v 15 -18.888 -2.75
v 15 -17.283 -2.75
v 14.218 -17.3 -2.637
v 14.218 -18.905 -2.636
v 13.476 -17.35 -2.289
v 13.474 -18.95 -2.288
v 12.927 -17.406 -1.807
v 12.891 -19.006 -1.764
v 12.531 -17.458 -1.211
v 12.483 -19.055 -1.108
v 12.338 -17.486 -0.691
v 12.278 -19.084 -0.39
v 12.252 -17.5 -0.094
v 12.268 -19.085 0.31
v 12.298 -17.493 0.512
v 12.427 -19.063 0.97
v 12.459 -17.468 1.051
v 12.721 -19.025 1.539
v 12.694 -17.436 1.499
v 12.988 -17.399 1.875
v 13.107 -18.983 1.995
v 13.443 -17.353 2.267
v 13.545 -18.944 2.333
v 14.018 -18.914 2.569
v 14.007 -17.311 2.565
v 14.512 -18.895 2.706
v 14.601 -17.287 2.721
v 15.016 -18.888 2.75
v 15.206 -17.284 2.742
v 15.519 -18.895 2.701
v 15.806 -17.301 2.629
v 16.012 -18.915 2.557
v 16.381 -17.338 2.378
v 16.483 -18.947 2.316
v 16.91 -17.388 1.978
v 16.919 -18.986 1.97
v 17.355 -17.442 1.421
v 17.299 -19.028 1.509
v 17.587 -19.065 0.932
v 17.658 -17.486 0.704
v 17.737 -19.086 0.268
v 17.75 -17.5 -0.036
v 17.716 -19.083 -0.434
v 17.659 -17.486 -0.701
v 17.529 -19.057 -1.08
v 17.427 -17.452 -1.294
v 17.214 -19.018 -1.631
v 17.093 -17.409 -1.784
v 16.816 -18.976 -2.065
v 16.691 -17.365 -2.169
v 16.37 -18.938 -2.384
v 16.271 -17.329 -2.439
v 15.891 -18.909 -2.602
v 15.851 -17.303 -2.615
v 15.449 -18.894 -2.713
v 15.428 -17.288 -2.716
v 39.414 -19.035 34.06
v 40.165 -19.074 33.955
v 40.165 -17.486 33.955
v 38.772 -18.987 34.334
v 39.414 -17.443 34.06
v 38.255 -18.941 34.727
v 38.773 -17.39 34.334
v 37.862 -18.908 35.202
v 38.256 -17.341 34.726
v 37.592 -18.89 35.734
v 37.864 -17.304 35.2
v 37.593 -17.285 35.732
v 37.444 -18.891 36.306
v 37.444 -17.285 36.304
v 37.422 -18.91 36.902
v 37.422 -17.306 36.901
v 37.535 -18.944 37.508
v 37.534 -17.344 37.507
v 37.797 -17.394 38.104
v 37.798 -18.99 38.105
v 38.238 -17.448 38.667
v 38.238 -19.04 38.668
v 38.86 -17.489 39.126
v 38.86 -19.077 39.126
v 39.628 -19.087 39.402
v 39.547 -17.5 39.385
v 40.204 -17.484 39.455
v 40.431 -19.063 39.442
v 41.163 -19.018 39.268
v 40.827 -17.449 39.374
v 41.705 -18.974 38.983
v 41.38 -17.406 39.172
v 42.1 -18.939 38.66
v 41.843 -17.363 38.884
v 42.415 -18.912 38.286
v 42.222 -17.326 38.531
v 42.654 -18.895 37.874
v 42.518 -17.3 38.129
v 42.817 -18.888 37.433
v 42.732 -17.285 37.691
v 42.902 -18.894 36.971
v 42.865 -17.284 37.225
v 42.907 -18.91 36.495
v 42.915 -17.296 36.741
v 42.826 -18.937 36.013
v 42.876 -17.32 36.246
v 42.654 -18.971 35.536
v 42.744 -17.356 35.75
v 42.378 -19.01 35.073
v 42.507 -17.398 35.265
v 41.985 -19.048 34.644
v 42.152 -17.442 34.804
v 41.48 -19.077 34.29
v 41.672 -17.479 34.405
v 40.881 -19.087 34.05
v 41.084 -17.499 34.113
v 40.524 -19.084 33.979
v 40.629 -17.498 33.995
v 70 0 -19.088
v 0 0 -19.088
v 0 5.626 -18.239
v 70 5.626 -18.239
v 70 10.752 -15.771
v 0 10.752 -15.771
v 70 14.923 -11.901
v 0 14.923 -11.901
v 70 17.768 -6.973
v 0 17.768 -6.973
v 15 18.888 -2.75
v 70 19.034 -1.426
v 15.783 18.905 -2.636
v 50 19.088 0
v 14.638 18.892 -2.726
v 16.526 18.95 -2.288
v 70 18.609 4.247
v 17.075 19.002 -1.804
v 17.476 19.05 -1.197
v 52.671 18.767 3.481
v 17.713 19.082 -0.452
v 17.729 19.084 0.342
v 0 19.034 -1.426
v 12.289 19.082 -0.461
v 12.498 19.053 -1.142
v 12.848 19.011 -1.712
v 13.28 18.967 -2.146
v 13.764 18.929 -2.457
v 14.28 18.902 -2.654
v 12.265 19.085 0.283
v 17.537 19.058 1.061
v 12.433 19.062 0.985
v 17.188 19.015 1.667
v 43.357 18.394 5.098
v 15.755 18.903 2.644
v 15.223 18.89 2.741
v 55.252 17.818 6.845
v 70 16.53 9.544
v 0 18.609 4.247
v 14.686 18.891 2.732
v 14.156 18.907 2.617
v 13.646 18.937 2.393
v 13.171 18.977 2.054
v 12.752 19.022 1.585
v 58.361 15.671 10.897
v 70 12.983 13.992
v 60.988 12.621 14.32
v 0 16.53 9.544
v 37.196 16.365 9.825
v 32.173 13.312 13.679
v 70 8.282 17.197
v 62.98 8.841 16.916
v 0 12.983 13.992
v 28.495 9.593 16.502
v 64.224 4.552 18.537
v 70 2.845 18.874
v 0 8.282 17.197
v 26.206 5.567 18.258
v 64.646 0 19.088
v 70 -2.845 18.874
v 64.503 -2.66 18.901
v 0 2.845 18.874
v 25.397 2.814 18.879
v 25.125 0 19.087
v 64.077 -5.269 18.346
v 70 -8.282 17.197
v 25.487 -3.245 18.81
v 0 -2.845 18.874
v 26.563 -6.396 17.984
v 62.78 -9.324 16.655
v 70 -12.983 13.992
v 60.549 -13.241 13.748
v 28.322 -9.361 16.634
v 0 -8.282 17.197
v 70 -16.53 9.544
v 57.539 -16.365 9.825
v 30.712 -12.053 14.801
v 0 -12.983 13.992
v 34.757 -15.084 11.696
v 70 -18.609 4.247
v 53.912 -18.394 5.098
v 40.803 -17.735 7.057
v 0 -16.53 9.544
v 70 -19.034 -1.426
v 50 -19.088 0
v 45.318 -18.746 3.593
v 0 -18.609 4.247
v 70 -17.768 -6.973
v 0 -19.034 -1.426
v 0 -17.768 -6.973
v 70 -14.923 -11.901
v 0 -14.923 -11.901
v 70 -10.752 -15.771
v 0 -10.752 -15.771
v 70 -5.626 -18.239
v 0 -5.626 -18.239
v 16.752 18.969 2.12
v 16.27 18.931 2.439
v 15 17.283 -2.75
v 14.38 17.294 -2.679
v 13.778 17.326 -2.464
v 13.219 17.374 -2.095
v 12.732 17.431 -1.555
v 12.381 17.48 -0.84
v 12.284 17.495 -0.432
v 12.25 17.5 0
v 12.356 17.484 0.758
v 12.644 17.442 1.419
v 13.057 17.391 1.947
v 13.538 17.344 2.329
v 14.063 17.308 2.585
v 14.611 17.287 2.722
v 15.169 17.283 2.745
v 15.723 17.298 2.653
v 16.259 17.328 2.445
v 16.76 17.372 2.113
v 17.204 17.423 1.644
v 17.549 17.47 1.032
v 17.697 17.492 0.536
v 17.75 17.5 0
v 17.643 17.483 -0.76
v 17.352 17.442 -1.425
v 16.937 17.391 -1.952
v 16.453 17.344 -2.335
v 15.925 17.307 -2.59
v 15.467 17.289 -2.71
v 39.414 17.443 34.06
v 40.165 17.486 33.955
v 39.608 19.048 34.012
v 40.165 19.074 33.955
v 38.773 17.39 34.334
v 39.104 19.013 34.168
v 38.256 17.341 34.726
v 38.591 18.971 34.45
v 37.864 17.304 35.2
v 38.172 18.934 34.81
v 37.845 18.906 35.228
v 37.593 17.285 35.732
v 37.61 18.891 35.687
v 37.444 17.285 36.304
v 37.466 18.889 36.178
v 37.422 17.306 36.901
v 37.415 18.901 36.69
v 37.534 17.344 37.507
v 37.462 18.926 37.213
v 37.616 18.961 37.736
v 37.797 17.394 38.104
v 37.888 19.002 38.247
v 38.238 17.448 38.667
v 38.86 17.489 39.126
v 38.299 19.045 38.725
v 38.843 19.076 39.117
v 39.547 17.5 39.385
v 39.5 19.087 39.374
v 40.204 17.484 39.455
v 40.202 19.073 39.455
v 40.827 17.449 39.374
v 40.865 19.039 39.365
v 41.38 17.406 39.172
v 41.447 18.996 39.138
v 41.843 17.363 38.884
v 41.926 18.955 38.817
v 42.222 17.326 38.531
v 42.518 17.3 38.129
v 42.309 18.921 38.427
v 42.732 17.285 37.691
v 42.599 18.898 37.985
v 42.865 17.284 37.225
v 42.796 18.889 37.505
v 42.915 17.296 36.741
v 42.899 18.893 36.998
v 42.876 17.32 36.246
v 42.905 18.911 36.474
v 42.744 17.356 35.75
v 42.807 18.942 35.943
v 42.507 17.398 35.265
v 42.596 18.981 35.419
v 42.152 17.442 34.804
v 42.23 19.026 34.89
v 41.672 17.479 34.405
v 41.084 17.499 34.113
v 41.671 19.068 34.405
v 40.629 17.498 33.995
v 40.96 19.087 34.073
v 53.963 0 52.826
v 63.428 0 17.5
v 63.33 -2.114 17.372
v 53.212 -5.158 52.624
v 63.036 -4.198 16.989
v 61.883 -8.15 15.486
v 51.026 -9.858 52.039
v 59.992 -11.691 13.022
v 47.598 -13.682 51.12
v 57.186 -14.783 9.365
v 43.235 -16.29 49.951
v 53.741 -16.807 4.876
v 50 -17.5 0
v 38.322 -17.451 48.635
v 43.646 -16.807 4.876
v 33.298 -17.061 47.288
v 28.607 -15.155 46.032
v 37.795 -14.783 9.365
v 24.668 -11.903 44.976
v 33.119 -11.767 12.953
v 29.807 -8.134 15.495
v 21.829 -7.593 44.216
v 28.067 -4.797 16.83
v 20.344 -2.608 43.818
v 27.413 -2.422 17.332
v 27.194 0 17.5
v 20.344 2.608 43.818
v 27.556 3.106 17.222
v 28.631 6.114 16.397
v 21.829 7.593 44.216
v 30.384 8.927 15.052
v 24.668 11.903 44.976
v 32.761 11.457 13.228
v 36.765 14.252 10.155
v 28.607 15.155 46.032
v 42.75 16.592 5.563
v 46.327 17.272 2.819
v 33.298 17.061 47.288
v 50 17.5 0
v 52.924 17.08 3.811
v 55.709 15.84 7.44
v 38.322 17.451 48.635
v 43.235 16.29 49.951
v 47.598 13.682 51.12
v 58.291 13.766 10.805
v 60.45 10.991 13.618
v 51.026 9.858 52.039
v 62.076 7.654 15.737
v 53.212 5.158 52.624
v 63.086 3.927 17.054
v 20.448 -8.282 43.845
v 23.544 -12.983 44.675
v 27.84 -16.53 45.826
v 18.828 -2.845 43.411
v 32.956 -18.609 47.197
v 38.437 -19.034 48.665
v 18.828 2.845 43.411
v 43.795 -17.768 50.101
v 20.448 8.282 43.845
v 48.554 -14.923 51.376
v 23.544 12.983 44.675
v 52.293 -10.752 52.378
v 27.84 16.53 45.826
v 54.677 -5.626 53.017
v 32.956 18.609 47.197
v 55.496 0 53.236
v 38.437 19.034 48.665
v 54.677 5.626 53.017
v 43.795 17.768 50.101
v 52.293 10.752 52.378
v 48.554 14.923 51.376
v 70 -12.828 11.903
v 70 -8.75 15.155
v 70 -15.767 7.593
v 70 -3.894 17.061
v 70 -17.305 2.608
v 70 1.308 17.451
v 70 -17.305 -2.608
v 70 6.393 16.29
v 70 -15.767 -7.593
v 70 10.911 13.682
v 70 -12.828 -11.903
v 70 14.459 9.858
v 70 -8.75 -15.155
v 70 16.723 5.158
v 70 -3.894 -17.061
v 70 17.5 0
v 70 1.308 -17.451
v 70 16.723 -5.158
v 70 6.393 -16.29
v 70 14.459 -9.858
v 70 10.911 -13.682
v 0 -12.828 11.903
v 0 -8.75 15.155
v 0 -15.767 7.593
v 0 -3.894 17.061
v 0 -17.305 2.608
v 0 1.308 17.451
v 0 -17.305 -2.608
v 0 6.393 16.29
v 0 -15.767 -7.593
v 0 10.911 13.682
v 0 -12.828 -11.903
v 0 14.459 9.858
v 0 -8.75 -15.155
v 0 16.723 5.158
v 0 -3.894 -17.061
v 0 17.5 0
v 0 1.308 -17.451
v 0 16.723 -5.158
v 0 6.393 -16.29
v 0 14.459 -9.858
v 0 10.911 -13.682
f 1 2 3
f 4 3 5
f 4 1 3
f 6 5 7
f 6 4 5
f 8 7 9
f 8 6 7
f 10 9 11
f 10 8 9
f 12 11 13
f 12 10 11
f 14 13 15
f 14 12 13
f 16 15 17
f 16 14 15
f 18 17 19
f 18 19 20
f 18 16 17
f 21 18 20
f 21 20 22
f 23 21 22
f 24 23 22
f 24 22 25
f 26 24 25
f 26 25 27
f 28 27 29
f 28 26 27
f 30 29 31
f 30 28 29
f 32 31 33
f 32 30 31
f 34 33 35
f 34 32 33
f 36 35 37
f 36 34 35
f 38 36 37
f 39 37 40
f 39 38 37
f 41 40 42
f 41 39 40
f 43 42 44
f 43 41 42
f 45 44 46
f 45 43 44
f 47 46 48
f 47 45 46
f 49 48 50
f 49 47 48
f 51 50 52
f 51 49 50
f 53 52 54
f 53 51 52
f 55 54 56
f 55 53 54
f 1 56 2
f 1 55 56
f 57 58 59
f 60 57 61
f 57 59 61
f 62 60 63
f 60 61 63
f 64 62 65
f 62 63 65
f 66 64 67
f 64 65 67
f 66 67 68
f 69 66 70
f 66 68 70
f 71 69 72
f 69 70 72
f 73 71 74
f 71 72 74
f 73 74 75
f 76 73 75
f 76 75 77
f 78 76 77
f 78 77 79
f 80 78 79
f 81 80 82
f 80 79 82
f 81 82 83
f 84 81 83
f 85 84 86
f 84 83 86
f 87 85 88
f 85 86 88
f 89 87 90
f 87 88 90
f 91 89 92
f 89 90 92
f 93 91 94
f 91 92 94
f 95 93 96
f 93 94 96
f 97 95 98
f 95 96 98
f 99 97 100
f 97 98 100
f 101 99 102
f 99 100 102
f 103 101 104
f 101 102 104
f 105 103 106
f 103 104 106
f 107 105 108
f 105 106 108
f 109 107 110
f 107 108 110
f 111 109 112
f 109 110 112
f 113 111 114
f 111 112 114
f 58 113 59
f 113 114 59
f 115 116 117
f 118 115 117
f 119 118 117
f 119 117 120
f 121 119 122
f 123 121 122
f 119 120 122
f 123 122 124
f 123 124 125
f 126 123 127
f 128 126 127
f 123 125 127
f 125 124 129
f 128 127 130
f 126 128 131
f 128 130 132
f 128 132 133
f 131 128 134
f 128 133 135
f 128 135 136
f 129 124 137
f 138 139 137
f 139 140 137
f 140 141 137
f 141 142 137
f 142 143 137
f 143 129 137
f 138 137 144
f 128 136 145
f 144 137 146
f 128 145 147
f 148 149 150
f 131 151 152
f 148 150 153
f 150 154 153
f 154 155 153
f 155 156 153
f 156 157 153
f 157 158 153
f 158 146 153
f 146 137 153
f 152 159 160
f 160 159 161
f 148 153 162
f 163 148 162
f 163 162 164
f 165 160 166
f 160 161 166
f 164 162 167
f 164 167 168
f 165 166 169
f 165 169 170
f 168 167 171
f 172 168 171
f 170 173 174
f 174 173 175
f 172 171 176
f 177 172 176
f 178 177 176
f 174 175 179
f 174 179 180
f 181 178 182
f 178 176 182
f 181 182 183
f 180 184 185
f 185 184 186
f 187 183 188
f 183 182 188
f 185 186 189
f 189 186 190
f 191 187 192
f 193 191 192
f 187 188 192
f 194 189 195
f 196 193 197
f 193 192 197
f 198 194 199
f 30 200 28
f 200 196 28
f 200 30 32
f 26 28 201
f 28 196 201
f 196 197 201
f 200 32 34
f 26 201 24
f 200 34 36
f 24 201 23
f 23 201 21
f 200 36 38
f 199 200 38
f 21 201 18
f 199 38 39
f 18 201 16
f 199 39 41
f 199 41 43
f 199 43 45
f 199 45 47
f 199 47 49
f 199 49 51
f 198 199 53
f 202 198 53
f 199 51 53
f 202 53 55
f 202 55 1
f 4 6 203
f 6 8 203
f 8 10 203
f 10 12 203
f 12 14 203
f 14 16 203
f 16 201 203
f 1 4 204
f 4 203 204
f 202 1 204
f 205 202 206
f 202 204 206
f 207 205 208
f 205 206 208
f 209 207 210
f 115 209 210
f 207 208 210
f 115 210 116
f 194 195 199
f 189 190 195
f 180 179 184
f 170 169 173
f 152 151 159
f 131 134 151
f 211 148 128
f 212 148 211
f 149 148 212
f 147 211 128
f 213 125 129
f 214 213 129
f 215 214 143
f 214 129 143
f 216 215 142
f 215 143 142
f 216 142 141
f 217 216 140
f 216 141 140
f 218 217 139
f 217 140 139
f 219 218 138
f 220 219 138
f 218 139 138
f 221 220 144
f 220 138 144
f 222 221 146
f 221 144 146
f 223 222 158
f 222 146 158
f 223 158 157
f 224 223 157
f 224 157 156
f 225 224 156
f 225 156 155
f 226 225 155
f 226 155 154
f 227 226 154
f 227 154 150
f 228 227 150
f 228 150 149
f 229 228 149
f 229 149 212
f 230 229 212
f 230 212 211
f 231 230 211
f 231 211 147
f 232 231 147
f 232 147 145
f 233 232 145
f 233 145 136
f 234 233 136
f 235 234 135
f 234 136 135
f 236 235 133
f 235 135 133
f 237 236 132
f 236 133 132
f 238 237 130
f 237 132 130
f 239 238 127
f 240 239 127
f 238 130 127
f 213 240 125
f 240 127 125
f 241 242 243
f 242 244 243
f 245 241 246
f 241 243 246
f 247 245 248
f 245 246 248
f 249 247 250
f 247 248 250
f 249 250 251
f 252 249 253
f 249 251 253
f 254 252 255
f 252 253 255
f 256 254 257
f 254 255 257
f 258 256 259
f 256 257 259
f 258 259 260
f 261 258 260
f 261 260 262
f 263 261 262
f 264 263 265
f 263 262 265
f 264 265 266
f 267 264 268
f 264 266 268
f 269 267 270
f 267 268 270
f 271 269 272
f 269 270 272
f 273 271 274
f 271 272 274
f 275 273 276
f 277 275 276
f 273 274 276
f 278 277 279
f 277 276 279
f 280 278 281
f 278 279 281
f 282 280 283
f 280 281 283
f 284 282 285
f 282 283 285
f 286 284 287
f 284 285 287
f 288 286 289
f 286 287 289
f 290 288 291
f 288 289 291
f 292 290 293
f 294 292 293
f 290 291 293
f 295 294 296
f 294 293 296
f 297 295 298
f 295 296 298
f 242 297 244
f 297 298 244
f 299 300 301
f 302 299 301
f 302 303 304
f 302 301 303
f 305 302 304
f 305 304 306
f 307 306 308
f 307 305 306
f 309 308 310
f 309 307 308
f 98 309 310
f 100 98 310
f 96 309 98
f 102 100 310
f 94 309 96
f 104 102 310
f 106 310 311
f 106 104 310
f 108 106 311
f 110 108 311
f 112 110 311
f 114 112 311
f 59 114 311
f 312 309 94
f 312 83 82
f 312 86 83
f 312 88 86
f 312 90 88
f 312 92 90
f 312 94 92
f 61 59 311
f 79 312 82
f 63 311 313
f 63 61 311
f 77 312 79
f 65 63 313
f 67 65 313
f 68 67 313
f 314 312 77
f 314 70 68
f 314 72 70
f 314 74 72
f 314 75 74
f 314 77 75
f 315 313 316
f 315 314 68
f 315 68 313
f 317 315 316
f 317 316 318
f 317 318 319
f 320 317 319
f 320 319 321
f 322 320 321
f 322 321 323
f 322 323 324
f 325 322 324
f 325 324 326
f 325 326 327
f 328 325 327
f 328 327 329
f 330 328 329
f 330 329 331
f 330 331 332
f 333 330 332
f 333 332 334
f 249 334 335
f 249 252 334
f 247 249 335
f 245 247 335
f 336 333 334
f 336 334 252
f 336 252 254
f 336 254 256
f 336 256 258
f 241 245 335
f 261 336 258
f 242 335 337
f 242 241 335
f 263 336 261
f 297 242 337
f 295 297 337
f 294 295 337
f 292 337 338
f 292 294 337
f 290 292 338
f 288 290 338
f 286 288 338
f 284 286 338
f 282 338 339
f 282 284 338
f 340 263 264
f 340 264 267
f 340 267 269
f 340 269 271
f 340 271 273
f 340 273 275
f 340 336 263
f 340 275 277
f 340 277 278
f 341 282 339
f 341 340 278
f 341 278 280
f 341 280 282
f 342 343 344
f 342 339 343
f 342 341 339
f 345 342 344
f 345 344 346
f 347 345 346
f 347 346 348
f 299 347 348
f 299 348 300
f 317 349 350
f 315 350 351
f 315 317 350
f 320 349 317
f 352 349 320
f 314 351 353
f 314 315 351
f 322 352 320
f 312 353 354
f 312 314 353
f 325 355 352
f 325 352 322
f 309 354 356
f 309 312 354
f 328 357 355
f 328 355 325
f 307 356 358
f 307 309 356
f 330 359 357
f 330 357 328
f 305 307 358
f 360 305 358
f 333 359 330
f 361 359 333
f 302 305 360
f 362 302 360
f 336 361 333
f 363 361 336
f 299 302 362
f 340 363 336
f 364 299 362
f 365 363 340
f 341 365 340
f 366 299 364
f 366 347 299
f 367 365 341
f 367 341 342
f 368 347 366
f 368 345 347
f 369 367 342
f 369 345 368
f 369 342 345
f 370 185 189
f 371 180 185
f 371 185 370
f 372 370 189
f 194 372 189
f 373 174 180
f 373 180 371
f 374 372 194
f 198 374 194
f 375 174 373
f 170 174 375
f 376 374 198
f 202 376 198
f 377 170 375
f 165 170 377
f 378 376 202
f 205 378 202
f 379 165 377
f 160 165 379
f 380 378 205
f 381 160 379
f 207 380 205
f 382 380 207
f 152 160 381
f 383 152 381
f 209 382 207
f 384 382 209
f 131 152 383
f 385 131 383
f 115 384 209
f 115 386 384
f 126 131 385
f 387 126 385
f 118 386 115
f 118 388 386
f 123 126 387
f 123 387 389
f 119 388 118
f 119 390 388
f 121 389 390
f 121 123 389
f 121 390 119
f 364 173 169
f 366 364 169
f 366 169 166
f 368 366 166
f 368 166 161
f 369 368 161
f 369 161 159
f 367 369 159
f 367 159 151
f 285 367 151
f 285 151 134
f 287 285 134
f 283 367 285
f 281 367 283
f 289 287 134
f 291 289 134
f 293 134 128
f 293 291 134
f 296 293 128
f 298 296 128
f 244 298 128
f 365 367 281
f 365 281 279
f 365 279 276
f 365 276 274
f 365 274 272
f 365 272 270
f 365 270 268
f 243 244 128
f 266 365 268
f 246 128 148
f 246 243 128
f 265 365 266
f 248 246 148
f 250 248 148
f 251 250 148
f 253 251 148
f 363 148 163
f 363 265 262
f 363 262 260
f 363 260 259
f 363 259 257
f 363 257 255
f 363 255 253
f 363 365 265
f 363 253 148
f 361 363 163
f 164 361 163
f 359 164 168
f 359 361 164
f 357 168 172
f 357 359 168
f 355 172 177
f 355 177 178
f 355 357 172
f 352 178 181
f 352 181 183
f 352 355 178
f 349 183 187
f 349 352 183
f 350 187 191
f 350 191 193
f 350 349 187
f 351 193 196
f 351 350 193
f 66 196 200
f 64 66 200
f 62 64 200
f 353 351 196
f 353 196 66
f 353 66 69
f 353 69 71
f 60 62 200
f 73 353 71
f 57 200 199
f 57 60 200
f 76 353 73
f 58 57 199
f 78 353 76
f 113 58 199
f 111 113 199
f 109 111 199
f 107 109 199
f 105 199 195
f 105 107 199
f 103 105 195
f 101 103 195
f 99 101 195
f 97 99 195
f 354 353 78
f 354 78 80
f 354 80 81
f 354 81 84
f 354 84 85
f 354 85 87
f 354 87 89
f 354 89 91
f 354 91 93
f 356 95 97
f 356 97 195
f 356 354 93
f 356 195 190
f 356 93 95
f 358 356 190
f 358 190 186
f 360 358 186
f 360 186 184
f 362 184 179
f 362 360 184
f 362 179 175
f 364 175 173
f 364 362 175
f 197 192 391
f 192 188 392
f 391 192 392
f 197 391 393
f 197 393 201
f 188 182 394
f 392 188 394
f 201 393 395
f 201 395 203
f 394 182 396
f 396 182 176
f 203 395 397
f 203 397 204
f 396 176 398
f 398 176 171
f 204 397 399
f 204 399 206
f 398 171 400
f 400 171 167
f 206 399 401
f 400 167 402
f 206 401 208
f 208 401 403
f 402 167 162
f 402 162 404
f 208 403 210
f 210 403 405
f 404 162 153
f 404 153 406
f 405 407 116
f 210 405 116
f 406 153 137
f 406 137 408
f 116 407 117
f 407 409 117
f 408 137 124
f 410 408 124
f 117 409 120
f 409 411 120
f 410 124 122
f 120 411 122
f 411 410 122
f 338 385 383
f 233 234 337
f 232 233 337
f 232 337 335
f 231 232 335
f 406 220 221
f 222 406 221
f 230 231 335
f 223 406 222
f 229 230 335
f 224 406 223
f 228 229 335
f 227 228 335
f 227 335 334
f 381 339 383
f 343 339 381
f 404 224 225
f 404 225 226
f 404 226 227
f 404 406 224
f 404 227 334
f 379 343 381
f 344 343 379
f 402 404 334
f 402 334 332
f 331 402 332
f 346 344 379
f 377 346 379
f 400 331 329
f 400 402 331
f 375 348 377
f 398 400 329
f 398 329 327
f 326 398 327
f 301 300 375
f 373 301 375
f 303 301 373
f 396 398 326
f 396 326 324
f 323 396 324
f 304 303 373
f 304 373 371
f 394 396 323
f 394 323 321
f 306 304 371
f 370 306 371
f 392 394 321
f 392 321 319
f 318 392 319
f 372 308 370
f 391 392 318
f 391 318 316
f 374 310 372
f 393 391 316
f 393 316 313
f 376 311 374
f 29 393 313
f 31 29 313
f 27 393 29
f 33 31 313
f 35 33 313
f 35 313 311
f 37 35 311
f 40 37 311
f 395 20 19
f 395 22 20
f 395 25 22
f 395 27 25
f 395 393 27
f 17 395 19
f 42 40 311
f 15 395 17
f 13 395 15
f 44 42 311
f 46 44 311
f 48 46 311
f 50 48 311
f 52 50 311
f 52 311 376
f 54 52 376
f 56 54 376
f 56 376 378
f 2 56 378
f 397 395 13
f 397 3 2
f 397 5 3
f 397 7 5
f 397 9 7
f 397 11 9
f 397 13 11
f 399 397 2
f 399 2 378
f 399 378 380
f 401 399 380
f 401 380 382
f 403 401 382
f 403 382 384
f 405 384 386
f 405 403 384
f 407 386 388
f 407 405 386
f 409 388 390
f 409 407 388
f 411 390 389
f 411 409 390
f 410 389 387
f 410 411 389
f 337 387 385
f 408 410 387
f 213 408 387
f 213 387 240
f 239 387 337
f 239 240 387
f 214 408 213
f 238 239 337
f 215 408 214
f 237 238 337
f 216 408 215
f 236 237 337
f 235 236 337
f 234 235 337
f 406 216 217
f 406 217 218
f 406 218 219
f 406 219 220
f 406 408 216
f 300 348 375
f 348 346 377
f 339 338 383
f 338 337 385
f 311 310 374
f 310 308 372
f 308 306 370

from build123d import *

# Parameters (mm, degrees)
SKETCH2_R                     = 19.0875
BOSS_EXTRUDE1_DEPTH           = 100
BOSS_EXTRUDE2_REACH           = 96.162
BOSS_EXTRUDE2_END_RADIUS      = 19.0875
SKETCH3_R                     = 19.0875
SHELL1_OUTLINE_R              = 17.5
SHELL1_DEPTH                  = 100
SHELL1_START                  = -37.059047745
SHELL1_2_OUTLINE_R            = 17.5
SHELL1_2_DEPTH                = 50.0000001
SKETCH6_W                     = 2.75
SKETCH6_H                     = 19.0875
M5_CLEARANCE_HOLE1_AT_2_COUNT = 2
M5_CLEARANCE_HOLE1_AT_2_PITCH = 44.503273363
MIRROR1_COPY_1_SKETCH_W       = 2.75
MIRROR1_COPY_1_SKETCH_H       = 19.0875
CUT_EXTRUDE1_START            = -30
SKETCH7_R                     = 19.0875
SKETCH7_R_2                   = 17.5
CUT_EXTRUDE1_DEPTH            = 30


with BuildPart() as part:
    # Sketch2 → Boss-Extrude1 (new body)
    with BuildSketch(Plane(origin=(0, 0, 0), x_dir=(0, 0, -1), z_dir=(1, 0, 0))):
        Circle(SKETCH2_R)
    extrude(amount=BOSS_EXTRUDE1_DEPTH)

    # Boss-Extrude2: up to this cylinder (the profile starts outside it)
    boss_extrude2_end = Plane(origin=(37.059048, 0, 0), z_dir=(-1, 0, 0)) * Cylinder(BOSS_EXTRUDE2_END_RADIUS, 231.499, mode=Mode.PRIVATE)
    # Sketch3 → Boss-Extrude2 (add, up to the surface)
    with BuildSketch(Plane(origin=(37.059047745, 0, 48.296291314), x_dir=(0.9659258262890673, 0, 0.2588190451025246), z_dir=(-0.2588190451025246, 0, 0.9659258262890673)), mode=Mode.PRIVATE) as boss_extrude2_sk1:
        Circle(SKETCH3_R)
    boss_extrude2_tool1 = extrude(boss_extrude2_sk1.sketch, amount=-BOSS_EXTRUDE2_REACH, mode=Mode.PRIVATE) - boss_extrude2_end
    add(boss_extrude2_tool1.solids().sort_by_distance((37.059048, 0, 48.296291))[0])

    # Shell1: read off the stored shape, not the designer's step
    # Shell1 outline → Shell1 (cut)
    with BuildSketch(Plane.YZ):
        Circle(SHELL1_OUTLINE_R)
    extrude(amount=SHELL1_DEPTH, mode=Mode.SUBTRACT)

    # Shell1 2 outline → Shell1 2 (cut)
    with BuildSketch(Plane(origin=(0, 0, 0), x_dir=(0.9659258262890672, 0, 0.2588190451025251), z_dir=(0.25881904510252507, 0, -0.9659258262890672)).offset(SHELL1_START)):
        with Locations((48.296291314, 0)):
            Circle(SHELL1_2_OUTLINE_R)
    extrude(amount=SHELL1_2_DEPTH, mode=Mode.SUBTRACT)

    # Sketch6 → M5 Clearance Hole1 (revolve, cut)
    with BuildSketch(Plane(origin=(15, 0, 0), x_dir=(0, 0, -1), z_dir=(1, 0, 0))):
        with Locations((1.375, 9.54375)):
            Rectangle(SKETCH6_W, SKETCH6_H)
    m5_clearance_hole1 = revolve(axis=Axis((15, -6.35, 0), (0, 1, 0)), mode=Mode.SUBTRACT)

    # M5 Clearance Hole1 at 2: M5 Clearance Hole1 ×2
    with Locations(*[Vector(0.5654612432844534, 0, 0.8247748676719001) * (i * M5_CLEARANCE_HOLE1_AT_2_PITCH) for i in range(1, M5_CLEARANCE_HOLE1_AT_2_COUNT)]):
        add(m5_clearance_hole1, mode=Mode.SUBTRACT)

    # Mirror1: M5 Clearance Hole1 across plane
    add(m5_clearance_hole1.mirror(Plane.ZX), mode=Mode.SUBTRACT)

    # Mirror1 copy 1 sketch → Mirror1 copy 1 (revolve, cut)
    with BuildSketch(Plane(origin=(40.164876286, 0, 36.705181399), x_dir=(0, 0, -1), z_dir=(1, 0, 0))):
        with Locations((1.375, -9.54375)):
            Rectangle(MIRROR1_COPY_1_SKETCH_W, MIRROR1_COPY_1_SKETCH_H)
    revolve(axis=Axis((40.164876286, 6.35, 36.705181399), (0, 1, 0)), mode=Mode.SUBTRACT)

    # Sketch7 → Cut-Extrude1 (cut)
    with BuildSketch(Plane(origin=(100, 0, 0), x_dir=(0, 0, -1), z_dir=(1, 0, 0)).offset(CUT_EXTRUDE1_START)):
        Circle(SKETCH7_R)
        Circle(SKETCH7_R_2, mode=Mode.SUBTRACT)
    extrude(amount=CUT_EXTRUDE1_DEPTH, mode=Mode.SUBTRACT)


solid = part.part
